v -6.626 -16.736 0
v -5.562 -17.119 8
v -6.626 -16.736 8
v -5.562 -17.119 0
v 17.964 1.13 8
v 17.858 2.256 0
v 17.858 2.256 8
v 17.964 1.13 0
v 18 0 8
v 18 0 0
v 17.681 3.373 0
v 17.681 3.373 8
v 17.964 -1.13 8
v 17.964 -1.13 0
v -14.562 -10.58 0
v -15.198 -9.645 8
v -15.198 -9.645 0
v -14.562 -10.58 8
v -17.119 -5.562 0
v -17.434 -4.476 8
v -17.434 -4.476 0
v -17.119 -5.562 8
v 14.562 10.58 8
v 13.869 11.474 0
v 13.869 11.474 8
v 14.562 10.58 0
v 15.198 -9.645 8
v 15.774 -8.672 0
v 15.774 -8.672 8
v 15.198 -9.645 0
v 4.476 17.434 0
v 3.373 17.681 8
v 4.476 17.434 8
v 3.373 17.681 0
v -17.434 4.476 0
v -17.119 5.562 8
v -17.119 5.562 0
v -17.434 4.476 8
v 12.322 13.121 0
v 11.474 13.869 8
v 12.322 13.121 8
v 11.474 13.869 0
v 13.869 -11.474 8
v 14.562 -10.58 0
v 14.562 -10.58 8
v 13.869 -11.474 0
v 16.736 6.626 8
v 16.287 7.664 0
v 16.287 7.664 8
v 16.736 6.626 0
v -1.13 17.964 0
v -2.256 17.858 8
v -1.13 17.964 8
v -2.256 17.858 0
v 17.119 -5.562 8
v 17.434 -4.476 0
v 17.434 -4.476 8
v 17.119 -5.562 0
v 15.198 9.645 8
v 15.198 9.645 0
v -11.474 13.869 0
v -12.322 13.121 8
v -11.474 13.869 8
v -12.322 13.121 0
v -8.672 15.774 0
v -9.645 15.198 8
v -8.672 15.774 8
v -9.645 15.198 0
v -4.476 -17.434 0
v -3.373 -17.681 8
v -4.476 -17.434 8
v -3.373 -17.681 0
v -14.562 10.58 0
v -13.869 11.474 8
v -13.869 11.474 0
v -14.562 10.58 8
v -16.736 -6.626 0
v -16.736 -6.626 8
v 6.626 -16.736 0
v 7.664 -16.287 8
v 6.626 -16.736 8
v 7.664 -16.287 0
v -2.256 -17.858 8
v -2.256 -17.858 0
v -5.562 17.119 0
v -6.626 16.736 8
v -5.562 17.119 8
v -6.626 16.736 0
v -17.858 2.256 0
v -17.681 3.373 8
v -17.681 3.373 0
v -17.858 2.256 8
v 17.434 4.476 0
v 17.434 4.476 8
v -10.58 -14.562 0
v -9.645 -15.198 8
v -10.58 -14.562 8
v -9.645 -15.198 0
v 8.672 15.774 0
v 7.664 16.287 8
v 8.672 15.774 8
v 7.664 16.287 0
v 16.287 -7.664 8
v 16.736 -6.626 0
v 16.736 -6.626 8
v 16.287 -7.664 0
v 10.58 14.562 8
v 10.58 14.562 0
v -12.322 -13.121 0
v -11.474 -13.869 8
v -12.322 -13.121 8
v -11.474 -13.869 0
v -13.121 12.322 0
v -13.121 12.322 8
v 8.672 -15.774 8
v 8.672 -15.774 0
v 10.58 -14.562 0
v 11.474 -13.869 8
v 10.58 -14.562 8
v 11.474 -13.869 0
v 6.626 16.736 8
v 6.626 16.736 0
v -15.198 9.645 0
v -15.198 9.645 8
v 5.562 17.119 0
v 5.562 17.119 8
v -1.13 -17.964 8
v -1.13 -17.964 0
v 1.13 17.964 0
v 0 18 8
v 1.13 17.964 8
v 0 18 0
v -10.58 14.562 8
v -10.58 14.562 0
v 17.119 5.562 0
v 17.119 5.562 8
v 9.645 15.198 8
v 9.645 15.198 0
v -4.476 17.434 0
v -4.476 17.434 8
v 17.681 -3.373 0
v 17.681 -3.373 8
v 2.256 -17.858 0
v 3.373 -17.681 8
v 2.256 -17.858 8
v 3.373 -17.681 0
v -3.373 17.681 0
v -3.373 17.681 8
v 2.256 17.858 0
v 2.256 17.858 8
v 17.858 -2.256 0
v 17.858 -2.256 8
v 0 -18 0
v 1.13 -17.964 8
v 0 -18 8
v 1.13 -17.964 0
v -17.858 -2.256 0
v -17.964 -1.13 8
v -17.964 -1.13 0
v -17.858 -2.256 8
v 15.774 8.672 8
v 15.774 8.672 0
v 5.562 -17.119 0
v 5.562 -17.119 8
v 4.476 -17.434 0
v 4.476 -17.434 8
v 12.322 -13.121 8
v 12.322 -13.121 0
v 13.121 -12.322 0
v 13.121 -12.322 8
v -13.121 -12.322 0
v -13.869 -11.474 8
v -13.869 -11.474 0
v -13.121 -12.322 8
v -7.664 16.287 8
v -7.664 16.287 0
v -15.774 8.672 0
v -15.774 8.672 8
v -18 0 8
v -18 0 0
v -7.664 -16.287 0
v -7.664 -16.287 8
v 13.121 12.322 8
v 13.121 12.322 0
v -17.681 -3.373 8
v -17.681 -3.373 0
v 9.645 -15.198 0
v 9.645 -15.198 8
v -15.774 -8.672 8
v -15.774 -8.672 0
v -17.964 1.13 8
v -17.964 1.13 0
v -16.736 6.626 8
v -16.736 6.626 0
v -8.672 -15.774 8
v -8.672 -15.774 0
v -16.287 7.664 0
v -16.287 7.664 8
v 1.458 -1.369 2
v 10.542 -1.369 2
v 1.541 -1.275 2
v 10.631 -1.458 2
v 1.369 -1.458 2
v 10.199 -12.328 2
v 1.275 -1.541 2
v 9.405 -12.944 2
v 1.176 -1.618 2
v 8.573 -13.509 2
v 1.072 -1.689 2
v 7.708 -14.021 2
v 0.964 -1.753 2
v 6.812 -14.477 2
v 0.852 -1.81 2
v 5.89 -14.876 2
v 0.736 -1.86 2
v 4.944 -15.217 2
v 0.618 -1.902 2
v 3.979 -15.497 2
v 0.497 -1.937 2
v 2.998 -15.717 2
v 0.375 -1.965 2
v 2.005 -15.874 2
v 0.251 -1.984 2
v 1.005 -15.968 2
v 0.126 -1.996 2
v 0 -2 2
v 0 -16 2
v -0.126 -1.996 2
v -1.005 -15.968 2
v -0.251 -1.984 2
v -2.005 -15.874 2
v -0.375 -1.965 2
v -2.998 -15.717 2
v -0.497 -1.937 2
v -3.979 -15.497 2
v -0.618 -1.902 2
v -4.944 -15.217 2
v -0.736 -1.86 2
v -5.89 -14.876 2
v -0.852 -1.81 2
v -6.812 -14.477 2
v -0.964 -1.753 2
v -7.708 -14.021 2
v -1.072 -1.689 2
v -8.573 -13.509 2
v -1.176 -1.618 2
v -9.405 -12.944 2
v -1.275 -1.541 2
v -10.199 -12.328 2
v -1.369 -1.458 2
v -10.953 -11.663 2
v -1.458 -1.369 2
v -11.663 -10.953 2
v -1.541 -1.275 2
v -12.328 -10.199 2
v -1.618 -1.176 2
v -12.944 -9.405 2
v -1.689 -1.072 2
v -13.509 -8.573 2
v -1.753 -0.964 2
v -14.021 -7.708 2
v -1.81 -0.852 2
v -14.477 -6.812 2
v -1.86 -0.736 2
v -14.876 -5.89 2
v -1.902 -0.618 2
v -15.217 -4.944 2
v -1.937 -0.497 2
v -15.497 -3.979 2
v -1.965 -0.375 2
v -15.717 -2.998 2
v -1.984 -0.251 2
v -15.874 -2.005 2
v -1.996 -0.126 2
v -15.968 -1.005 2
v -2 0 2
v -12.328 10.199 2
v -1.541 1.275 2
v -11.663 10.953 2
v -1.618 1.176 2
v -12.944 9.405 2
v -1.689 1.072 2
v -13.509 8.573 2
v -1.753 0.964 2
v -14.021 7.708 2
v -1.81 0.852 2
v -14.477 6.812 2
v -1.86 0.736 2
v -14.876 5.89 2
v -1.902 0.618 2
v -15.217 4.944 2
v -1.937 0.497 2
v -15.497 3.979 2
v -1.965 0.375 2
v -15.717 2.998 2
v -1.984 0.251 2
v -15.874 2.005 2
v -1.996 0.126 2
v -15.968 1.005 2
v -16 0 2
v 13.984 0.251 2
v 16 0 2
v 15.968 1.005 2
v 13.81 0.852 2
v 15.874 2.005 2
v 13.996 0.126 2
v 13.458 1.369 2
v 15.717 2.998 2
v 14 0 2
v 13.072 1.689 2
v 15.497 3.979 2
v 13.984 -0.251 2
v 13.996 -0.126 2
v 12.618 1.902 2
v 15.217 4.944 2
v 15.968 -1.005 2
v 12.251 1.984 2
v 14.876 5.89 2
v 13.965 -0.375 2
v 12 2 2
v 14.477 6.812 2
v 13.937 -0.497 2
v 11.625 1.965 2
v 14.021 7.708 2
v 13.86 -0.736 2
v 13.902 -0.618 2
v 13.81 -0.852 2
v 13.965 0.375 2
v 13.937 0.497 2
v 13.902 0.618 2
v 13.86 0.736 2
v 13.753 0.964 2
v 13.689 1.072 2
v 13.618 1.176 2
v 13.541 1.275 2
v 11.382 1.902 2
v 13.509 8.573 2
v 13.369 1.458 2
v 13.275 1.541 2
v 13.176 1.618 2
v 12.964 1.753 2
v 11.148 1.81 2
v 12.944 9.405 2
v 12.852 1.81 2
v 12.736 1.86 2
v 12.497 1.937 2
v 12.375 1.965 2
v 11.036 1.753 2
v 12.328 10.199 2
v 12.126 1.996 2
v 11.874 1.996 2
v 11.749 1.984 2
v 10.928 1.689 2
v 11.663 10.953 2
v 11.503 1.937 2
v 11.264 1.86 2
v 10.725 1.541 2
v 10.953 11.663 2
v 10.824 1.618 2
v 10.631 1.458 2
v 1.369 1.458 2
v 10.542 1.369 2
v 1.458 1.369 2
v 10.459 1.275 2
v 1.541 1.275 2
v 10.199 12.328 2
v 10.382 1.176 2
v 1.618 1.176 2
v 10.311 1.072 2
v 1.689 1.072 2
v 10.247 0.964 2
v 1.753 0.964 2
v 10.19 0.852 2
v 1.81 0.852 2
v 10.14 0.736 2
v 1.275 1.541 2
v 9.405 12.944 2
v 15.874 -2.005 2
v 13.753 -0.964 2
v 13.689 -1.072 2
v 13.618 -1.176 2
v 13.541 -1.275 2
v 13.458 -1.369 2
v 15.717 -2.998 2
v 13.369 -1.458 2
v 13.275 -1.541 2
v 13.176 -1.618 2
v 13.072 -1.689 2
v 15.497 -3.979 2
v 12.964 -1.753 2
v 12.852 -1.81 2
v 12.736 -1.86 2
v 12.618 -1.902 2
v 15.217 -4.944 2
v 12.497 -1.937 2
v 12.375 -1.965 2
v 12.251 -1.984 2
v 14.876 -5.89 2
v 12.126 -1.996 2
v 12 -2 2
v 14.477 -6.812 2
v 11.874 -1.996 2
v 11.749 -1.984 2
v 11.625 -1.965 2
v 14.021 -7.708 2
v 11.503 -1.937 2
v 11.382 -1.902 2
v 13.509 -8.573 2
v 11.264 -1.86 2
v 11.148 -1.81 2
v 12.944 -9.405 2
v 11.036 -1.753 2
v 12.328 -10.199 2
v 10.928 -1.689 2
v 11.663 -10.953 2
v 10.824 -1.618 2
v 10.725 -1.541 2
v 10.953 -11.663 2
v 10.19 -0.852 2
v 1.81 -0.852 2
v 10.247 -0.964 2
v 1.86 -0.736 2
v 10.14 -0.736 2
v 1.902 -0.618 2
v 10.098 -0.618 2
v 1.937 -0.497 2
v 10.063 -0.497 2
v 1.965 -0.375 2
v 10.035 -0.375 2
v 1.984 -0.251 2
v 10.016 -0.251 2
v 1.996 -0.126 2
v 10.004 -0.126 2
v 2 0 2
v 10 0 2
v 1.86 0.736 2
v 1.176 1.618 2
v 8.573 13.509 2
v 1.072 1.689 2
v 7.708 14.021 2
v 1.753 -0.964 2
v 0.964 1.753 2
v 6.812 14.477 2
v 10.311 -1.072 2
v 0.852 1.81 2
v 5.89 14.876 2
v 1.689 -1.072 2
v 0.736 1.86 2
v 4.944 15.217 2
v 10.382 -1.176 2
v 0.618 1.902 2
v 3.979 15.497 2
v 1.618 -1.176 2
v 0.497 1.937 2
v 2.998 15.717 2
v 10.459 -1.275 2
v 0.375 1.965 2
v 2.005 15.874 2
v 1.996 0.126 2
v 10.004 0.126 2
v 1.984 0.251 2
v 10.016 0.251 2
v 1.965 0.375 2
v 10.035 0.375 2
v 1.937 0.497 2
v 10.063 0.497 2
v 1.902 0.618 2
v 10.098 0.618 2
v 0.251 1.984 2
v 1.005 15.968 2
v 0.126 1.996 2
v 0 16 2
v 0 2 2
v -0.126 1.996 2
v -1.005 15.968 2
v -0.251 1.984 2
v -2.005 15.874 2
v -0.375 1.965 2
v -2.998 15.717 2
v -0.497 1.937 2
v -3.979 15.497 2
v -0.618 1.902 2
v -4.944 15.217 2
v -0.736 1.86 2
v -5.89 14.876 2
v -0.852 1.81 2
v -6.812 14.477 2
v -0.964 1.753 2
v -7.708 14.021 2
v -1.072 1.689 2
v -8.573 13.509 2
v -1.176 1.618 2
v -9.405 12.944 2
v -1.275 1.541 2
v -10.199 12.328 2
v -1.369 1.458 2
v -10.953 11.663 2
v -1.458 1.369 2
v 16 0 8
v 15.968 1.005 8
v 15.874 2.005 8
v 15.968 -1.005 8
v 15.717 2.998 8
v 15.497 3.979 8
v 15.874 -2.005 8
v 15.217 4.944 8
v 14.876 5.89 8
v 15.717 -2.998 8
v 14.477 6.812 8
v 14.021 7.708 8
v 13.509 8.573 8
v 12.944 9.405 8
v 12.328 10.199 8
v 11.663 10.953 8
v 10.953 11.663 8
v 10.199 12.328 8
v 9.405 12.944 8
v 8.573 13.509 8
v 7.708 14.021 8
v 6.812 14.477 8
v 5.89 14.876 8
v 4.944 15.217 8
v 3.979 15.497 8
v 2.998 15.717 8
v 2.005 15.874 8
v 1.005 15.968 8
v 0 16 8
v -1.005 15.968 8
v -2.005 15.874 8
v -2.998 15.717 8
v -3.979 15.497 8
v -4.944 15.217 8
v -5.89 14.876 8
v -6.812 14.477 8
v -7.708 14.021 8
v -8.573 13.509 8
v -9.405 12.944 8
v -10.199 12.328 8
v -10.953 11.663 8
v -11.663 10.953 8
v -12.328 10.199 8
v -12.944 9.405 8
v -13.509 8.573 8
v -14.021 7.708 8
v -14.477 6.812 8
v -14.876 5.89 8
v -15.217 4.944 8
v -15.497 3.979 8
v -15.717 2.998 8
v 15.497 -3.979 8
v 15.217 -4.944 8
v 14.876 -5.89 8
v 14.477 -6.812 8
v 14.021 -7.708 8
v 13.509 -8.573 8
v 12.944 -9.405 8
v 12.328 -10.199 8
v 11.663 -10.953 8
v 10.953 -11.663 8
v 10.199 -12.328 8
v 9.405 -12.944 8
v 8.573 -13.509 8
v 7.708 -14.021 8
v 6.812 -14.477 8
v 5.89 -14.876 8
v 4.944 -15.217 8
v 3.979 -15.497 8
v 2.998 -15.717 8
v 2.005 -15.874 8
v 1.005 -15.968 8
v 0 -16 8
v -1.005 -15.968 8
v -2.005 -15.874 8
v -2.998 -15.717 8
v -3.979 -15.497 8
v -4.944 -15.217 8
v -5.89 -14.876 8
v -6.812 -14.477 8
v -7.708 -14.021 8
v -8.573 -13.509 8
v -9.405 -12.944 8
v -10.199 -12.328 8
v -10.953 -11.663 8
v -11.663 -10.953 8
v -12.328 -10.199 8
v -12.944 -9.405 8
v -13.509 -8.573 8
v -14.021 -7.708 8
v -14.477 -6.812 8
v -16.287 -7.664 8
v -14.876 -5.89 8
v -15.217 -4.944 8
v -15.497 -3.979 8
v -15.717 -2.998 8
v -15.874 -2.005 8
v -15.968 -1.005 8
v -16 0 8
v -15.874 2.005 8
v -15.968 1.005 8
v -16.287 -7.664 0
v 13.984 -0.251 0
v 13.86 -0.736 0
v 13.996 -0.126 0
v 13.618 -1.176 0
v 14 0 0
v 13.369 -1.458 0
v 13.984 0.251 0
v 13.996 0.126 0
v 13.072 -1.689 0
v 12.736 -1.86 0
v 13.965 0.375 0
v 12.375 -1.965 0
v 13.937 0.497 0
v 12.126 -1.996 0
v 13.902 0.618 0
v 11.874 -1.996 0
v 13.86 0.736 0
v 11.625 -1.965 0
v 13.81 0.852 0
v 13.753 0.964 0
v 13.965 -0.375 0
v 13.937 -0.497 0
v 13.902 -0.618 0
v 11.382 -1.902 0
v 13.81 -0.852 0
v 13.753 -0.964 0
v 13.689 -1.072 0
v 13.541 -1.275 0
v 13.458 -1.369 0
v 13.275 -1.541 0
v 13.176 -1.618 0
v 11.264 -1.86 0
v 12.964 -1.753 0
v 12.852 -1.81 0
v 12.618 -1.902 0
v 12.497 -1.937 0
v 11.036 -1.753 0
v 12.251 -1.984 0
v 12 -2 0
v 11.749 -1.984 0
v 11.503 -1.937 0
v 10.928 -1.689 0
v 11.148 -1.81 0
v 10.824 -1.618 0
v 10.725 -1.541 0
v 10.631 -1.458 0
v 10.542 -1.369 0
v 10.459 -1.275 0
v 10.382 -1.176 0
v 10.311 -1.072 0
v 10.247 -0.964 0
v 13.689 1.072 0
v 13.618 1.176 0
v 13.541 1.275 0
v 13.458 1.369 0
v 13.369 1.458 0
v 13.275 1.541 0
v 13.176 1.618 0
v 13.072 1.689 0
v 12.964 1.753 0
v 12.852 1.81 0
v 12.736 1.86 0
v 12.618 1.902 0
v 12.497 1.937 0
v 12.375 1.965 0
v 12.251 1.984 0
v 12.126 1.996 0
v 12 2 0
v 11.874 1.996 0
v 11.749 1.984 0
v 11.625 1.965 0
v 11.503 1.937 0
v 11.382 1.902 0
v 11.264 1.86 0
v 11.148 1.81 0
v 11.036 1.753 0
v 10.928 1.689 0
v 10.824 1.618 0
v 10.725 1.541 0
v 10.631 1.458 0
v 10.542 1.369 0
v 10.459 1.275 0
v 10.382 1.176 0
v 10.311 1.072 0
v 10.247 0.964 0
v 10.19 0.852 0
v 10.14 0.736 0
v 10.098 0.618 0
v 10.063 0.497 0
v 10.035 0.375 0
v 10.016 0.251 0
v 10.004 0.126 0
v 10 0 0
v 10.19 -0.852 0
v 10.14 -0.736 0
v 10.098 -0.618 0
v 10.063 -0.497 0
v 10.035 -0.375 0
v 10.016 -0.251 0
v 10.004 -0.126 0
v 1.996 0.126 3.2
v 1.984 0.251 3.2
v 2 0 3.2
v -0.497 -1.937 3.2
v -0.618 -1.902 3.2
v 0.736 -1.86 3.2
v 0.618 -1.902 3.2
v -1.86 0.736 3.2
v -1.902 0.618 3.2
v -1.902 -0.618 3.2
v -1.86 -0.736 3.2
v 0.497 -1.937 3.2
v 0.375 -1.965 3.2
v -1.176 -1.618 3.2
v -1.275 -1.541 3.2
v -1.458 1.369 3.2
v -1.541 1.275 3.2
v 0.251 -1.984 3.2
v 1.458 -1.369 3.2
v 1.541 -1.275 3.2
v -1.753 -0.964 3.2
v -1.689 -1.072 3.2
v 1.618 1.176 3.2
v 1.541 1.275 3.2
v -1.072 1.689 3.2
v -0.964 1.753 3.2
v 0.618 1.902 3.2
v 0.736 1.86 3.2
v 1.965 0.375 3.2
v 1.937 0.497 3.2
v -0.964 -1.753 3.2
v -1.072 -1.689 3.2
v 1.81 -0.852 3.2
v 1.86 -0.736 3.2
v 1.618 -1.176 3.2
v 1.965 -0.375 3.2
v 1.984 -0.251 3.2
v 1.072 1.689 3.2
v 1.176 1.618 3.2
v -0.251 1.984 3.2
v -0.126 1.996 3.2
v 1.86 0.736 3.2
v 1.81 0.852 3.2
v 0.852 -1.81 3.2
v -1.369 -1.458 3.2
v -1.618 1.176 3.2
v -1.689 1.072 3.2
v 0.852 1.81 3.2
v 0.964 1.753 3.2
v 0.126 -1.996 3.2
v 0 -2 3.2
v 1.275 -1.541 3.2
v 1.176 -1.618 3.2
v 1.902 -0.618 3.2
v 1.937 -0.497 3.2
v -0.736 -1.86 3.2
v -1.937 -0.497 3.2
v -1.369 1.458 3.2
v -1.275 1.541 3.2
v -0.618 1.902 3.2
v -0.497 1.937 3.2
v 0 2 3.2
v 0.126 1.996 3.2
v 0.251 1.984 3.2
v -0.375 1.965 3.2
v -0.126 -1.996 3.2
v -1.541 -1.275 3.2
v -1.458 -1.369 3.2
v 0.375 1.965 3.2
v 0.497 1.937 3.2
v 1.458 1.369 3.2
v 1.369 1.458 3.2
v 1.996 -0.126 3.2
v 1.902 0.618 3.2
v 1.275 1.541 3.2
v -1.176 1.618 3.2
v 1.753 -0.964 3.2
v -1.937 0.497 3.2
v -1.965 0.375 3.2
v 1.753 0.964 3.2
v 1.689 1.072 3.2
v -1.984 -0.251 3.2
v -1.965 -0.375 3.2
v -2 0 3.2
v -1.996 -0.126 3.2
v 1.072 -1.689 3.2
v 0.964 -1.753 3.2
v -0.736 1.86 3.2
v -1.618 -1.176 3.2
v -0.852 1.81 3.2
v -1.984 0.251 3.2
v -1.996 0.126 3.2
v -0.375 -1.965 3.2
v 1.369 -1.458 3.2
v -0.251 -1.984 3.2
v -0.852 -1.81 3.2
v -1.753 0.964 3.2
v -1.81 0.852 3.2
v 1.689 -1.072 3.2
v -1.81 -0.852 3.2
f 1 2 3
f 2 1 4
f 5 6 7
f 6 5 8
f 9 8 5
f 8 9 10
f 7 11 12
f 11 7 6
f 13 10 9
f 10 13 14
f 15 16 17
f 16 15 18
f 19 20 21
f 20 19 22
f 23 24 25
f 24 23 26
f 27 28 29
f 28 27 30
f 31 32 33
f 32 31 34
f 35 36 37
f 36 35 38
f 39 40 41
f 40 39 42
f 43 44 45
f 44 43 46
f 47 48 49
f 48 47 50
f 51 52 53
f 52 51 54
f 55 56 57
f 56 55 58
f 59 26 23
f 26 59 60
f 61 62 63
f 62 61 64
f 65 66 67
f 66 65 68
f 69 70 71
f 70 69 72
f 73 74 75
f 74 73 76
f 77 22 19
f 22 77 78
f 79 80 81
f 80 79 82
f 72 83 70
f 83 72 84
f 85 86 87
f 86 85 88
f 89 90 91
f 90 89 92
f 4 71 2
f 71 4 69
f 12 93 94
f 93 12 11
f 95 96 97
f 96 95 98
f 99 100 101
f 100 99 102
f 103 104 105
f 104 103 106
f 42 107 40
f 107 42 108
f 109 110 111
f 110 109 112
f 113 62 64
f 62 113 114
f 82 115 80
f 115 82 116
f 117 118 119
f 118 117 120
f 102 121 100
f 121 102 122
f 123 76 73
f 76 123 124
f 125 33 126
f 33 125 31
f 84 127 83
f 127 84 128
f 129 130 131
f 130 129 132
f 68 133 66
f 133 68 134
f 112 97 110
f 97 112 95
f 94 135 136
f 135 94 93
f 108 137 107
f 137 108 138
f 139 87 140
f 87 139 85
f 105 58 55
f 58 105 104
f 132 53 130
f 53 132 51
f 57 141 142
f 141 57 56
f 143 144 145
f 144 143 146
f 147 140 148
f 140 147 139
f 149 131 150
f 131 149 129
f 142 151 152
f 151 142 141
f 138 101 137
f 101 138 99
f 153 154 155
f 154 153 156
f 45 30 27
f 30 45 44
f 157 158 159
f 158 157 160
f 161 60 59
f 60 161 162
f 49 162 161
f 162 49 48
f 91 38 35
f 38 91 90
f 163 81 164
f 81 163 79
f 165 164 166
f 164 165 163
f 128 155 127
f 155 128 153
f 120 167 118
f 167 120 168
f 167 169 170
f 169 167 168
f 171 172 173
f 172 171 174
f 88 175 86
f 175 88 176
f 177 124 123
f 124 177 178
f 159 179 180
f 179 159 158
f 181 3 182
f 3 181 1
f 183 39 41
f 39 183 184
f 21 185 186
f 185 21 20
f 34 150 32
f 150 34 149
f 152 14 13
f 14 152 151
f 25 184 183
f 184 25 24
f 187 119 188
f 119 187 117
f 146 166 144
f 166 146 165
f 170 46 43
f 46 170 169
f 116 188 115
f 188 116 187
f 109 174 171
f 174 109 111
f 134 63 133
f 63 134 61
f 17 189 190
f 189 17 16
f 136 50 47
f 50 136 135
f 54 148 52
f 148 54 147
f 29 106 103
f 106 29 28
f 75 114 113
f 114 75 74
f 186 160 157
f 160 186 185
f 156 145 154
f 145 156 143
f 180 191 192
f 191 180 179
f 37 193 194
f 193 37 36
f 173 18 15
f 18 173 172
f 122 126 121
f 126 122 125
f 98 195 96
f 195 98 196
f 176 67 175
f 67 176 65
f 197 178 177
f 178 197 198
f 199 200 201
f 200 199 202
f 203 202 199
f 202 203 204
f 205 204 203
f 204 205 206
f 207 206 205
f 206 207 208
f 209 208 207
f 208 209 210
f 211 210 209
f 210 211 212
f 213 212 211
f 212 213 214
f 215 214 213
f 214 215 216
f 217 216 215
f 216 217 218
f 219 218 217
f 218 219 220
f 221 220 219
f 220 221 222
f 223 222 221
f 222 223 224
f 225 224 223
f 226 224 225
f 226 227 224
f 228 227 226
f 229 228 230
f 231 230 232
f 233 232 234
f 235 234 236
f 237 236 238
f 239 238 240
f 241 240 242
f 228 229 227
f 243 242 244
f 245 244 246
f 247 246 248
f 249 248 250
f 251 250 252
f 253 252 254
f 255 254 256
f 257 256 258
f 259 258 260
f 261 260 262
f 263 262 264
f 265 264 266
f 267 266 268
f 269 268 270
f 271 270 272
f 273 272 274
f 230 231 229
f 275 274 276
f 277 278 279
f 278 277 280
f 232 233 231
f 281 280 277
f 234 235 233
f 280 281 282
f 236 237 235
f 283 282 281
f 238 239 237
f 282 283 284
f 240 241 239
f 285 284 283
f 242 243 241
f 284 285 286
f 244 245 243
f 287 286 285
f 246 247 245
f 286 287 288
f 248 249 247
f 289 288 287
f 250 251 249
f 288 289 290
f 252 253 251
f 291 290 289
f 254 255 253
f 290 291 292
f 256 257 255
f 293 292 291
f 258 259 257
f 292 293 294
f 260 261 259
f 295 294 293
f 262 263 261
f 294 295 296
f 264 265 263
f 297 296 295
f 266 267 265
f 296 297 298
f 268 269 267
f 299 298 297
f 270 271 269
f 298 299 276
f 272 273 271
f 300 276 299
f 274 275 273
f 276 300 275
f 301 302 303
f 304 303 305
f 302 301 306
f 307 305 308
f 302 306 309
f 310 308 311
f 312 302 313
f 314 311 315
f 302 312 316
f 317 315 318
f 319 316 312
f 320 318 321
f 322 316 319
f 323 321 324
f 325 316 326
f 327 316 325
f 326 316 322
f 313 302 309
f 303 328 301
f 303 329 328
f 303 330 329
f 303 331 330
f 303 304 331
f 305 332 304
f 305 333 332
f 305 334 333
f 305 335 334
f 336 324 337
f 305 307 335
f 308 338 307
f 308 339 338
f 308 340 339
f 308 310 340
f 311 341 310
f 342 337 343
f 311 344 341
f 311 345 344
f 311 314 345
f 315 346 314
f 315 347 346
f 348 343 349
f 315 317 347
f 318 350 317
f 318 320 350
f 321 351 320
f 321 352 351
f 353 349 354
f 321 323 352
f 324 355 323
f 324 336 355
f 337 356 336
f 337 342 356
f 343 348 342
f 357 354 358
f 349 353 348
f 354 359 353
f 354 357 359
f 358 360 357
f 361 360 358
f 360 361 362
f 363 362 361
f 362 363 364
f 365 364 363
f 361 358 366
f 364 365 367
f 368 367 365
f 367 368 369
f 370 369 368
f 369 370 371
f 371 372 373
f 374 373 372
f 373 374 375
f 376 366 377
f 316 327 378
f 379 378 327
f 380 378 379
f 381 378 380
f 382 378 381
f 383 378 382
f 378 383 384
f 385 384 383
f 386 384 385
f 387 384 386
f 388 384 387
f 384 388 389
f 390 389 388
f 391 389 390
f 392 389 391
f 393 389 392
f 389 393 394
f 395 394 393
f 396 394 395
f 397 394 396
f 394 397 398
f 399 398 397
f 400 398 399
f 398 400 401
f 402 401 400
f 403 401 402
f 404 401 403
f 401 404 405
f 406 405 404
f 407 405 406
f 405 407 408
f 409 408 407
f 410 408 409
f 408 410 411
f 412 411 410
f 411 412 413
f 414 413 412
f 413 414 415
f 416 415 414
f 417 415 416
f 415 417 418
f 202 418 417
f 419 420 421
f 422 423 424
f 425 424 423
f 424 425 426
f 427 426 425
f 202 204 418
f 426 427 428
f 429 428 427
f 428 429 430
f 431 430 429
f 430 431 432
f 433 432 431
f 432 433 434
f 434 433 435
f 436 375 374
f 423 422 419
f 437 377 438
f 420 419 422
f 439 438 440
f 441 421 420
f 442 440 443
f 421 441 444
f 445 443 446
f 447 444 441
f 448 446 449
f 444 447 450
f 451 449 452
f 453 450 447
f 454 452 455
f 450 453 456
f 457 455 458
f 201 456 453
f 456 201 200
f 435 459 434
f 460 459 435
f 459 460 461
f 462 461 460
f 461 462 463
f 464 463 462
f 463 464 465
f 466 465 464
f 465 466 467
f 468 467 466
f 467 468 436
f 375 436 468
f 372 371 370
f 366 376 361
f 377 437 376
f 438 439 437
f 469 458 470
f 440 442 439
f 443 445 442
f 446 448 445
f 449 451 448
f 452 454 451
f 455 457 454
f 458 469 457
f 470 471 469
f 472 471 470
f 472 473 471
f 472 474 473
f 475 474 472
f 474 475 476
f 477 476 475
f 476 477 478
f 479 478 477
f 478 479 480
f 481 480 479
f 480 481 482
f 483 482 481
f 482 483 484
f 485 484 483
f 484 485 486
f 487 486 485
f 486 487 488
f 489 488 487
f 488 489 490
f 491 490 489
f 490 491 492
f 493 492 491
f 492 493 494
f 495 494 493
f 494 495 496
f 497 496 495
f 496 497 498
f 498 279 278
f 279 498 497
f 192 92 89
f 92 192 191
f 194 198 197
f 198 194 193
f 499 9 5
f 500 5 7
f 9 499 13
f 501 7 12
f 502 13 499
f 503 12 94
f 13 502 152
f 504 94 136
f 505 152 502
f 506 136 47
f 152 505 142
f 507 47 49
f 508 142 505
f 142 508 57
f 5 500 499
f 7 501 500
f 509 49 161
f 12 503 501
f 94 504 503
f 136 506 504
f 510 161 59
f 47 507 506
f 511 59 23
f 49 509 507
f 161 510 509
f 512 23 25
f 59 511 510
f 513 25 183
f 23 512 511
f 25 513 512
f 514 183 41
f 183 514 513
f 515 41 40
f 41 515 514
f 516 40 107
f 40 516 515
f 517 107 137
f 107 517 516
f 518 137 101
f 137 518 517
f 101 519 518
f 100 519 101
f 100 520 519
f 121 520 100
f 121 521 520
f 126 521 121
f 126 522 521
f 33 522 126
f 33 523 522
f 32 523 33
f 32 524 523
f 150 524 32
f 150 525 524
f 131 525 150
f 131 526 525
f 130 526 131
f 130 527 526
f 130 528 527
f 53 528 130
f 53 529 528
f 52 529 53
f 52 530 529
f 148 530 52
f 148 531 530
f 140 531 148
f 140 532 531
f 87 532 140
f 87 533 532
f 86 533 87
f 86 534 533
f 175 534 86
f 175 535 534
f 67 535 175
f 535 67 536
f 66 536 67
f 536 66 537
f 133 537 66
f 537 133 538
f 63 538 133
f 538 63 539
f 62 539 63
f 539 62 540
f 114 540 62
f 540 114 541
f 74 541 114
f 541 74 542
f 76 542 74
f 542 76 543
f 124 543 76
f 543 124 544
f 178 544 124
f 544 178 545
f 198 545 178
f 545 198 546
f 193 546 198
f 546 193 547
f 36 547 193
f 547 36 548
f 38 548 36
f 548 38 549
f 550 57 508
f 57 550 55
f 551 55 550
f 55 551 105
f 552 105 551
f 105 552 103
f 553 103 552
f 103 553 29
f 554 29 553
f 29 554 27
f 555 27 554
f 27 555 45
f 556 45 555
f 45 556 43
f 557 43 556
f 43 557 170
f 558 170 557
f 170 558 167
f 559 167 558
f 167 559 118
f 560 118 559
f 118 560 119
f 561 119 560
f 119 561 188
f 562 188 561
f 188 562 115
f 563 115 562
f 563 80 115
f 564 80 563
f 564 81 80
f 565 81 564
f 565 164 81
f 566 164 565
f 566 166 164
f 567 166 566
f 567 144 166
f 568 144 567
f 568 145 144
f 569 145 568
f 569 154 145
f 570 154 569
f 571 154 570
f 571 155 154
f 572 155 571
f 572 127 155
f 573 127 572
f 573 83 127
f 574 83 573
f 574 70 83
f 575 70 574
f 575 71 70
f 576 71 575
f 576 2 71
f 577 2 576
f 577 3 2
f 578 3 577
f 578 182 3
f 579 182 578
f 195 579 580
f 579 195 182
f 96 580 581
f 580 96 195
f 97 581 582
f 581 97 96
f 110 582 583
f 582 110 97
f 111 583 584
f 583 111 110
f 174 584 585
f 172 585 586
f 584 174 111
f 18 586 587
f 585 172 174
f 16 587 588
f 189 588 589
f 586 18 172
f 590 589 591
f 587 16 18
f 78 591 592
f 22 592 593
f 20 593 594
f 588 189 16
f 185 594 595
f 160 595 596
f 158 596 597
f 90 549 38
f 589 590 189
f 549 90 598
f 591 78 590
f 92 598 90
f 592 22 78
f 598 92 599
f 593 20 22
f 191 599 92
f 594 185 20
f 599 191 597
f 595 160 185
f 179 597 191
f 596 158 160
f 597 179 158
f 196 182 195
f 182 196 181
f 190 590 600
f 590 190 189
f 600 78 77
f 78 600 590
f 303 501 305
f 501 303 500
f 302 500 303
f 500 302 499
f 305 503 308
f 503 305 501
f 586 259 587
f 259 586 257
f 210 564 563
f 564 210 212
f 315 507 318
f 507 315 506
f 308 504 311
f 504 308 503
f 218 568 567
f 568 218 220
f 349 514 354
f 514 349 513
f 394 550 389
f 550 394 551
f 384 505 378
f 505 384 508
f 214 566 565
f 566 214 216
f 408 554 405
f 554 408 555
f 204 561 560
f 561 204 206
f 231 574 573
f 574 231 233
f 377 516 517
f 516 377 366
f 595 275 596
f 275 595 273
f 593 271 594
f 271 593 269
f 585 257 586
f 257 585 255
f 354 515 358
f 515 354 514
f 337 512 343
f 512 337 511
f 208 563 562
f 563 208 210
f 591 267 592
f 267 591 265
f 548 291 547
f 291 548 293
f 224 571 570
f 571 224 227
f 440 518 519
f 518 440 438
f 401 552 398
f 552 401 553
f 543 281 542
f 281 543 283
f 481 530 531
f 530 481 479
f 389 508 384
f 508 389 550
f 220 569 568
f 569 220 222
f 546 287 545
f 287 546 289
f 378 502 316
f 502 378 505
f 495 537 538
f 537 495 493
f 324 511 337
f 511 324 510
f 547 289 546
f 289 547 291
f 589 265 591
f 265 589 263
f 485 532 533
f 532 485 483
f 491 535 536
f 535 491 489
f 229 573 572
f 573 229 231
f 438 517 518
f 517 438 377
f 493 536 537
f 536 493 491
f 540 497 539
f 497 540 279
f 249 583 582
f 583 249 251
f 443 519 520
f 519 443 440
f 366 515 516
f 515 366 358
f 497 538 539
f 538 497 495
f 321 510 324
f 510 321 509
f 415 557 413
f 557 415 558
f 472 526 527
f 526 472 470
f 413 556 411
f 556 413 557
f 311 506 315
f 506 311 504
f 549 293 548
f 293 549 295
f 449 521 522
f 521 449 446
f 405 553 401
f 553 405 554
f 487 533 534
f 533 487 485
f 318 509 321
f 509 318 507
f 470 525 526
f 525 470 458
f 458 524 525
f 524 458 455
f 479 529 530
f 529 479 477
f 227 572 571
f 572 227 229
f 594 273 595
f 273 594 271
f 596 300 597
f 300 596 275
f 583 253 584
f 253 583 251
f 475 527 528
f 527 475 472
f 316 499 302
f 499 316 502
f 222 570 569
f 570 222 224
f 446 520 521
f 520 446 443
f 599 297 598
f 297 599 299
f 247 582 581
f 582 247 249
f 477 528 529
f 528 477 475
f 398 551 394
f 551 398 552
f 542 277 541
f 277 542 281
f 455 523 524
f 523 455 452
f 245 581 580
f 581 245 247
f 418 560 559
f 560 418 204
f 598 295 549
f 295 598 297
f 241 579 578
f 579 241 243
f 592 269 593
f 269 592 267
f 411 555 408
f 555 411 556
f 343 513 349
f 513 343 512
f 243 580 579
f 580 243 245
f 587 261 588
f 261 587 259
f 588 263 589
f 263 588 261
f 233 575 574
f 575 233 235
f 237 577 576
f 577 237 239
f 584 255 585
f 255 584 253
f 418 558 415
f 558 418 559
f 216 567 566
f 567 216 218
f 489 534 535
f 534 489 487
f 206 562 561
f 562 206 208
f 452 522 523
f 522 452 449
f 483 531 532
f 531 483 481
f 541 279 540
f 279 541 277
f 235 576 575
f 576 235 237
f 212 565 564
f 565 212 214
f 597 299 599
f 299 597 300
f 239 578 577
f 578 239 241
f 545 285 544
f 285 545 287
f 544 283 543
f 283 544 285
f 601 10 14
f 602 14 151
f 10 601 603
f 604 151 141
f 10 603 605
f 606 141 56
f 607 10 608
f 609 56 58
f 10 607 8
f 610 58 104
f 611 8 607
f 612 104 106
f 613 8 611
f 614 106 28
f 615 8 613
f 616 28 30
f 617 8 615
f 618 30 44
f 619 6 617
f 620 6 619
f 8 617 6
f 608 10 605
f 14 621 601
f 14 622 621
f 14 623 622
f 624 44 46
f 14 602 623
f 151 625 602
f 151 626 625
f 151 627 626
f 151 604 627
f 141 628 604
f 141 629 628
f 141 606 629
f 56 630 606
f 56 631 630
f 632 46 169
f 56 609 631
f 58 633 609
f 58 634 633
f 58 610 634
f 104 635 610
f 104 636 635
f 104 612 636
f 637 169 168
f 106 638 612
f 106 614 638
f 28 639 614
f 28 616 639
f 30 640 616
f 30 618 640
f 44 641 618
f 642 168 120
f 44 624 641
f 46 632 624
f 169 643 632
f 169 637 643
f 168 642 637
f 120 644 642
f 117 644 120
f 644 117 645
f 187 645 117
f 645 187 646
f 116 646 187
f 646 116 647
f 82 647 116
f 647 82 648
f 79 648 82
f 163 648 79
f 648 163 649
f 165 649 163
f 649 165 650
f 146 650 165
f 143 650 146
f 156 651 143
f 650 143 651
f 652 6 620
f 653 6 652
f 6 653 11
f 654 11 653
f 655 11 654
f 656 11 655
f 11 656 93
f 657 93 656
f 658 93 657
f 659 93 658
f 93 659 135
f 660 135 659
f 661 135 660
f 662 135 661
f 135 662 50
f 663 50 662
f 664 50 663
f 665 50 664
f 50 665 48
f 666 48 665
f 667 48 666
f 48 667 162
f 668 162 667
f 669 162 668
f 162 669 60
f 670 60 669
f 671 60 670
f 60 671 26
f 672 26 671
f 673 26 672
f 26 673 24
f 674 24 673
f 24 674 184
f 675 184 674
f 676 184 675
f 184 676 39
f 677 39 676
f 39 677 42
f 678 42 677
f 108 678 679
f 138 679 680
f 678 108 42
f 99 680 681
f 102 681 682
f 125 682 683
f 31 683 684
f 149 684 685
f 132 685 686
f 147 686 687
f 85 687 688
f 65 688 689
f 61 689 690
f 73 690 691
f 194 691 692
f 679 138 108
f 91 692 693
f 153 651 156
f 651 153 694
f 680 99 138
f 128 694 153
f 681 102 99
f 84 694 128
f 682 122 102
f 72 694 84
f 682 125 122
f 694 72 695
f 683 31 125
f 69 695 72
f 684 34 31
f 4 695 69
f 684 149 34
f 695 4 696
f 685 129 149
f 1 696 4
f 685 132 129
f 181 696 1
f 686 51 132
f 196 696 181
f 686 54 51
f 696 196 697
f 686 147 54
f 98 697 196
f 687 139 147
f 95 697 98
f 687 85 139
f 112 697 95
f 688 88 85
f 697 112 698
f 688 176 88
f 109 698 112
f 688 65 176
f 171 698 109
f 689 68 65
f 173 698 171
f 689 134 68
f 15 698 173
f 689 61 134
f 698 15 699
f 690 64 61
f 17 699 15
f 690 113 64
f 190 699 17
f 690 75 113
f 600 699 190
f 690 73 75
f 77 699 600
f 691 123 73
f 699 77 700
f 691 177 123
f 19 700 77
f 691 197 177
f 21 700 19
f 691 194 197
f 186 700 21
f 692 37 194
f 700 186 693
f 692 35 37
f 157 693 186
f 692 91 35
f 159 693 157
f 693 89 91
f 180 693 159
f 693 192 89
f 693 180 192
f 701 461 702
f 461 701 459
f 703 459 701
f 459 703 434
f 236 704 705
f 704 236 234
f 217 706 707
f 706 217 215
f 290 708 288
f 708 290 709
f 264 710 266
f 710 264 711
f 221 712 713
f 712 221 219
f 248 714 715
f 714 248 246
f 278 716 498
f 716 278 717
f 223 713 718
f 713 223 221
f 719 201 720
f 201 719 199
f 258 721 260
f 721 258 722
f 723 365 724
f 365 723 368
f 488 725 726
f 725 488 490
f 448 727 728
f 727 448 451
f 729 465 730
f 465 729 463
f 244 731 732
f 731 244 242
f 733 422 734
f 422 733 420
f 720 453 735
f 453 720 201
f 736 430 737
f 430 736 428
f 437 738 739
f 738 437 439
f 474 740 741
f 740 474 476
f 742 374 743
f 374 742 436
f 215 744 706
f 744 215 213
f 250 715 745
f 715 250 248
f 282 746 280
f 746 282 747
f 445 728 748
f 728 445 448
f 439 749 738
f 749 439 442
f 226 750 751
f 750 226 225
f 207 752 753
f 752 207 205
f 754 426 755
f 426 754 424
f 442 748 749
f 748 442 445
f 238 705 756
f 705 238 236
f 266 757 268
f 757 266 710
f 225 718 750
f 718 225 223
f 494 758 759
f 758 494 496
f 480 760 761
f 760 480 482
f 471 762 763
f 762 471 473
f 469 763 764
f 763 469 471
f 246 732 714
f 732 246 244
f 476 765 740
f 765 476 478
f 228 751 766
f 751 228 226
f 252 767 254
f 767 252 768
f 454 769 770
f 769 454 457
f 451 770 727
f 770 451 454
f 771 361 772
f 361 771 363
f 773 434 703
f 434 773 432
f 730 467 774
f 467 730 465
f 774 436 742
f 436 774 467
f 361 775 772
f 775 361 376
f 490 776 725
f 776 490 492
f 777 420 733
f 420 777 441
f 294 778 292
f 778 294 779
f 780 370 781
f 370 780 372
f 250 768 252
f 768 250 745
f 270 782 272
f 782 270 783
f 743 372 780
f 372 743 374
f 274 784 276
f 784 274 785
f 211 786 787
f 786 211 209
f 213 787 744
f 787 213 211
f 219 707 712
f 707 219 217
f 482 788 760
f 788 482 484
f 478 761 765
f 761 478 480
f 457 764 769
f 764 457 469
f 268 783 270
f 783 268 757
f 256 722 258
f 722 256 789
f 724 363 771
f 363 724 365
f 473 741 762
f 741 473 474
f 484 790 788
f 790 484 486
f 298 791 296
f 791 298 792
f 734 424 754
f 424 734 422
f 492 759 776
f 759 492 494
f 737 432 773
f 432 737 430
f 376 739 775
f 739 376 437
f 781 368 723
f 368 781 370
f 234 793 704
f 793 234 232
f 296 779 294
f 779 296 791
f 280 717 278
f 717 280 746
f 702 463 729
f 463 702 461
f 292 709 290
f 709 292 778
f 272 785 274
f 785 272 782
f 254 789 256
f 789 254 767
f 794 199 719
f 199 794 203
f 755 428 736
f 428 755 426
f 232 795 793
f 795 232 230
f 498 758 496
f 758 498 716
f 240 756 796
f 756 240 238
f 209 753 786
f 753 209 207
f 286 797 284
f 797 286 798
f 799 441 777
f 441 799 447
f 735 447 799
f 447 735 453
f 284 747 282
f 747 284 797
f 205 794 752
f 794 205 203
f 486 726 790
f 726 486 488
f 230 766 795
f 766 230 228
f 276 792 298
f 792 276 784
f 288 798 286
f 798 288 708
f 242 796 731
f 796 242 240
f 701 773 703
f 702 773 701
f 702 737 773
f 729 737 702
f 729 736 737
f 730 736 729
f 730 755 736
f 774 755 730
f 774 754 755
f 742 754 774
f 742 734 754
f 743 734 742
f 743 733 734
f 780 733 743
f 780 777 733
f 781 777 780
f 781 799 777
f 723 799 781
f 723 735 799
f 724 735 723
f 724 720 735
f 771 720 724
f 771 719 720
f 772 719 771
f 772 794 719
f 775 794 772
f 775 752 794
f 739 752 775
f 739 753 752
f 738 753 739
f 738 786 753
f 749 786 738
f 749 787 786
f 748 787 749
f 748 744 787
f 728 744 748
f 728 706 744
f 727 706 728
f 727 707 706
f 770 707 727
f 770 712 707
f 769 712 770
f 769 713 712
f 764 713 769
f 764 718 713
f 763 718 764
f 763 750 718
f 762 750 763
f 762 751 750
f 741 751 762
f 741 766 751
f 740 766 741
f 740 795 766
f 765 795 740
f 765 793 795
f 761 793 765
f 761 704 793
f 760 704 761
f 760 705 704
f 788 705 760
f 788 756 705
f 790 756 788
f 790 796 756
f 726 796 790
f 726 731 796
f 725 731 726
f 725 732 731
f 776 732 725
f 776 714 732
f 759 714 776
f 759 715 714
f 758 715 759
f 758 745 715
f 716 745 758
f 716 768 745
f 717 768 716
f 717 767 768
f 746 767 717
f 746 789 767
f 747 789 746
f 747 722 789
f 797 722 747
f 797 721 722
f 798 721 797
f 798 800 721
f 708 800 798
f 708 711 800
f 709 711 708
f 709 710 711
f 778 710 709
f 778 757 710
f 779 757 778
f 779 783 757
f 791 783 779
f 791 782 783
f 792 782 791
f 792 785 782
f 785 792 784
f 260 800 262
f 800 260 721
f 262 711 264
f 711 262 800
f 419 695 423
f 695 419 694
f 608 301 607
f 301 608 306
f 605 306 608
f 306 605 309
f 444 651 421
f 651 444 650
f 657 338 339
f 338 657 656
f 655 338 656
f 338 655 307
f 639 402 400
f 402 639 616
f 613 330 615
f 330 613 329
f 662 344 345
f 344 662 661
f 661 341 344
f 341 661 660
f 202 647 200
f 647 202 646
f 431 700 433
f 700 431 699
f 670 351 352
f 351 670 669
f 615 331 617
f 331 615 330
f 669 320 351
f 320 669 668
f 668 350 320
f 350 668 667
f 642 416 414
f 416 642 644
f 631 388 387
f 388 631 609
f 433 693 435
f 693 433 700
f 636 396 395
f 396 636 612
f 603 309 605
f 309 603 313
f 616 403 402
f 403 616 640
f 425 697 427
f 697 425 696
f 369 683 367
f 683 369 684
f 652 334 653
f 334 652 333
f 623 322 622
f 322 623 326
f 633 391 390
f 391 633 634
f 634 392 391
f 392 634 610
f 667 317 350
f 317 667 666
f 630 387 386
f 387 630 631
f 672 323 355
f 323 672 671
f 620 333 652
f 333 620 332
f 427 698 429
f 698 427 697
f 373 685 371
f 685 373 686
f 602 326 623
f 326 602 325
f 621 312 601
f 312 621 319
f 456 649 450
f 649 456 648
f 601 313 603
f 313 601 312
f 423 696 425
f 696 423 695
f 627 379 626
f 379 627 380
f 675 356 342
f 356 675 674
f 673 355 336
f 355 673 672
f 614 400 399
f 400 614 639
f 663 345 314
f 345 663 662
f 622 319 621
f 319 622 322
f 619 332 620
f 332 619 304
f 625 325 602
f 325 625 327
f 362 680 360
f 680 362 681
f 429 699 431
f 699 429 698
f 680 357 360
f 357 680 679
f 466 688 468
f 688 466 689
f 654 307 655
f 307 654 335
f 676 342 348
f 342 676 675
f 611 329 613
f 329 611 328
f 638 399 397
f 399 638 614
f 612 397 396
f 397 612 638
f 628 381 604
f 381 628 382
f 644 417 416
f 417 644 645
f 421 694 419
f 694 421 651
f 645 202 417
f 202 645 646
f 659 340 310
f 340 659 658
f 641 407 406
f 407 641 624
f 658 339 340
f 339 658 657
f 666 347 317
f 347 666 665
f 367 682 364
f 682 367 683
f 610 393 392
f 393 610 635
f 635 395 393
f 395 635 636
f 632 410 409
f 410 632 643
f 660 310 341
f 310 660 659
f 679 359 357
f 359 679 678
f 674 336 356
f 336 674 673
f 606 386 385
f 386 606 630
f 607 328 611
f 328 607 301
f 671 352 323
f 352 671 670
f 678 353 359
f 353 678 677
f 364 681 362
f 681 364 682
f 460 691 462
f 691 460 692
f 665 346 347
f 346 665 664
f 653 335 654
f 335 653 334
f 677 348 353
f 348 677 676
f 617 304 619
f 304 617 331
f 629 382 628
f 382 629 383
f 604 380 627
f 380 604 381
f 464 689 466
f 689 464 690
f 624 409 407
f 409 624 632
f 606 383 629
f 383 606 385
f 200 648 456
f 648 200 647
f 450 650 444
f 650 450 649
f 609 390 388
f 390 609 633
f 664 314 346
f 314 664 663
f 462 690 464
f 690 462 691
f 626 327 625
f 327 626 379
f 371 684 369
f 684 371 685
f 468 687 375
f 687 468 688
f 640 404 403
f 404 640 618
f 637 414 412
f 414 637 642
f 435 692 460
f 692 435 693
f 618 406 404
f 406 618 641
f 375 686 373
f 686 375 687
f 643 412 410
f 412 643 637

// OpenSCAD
innerDiam=32;
rim=4;

innerInnerDiam=23;

height=6;
mediumHeight=20;

$fn=100;

difference() {
    union() {
        translate([0, 0, rim / 2]) difference() {
            cylinder(d = innerDiam + rim, h=height);

            cylinder(d=innerDiam, h=height);
        }

        cylinder(d = innerDiam + rim, h=rim / 2);

        translate([0, 0, rim / 2])  cylinder(d = rim, h=1.2);
    }

    translate([innerDiam / 2 - rim, 0, 0]) 
        cylinder(d=rim, h=rim);
}
